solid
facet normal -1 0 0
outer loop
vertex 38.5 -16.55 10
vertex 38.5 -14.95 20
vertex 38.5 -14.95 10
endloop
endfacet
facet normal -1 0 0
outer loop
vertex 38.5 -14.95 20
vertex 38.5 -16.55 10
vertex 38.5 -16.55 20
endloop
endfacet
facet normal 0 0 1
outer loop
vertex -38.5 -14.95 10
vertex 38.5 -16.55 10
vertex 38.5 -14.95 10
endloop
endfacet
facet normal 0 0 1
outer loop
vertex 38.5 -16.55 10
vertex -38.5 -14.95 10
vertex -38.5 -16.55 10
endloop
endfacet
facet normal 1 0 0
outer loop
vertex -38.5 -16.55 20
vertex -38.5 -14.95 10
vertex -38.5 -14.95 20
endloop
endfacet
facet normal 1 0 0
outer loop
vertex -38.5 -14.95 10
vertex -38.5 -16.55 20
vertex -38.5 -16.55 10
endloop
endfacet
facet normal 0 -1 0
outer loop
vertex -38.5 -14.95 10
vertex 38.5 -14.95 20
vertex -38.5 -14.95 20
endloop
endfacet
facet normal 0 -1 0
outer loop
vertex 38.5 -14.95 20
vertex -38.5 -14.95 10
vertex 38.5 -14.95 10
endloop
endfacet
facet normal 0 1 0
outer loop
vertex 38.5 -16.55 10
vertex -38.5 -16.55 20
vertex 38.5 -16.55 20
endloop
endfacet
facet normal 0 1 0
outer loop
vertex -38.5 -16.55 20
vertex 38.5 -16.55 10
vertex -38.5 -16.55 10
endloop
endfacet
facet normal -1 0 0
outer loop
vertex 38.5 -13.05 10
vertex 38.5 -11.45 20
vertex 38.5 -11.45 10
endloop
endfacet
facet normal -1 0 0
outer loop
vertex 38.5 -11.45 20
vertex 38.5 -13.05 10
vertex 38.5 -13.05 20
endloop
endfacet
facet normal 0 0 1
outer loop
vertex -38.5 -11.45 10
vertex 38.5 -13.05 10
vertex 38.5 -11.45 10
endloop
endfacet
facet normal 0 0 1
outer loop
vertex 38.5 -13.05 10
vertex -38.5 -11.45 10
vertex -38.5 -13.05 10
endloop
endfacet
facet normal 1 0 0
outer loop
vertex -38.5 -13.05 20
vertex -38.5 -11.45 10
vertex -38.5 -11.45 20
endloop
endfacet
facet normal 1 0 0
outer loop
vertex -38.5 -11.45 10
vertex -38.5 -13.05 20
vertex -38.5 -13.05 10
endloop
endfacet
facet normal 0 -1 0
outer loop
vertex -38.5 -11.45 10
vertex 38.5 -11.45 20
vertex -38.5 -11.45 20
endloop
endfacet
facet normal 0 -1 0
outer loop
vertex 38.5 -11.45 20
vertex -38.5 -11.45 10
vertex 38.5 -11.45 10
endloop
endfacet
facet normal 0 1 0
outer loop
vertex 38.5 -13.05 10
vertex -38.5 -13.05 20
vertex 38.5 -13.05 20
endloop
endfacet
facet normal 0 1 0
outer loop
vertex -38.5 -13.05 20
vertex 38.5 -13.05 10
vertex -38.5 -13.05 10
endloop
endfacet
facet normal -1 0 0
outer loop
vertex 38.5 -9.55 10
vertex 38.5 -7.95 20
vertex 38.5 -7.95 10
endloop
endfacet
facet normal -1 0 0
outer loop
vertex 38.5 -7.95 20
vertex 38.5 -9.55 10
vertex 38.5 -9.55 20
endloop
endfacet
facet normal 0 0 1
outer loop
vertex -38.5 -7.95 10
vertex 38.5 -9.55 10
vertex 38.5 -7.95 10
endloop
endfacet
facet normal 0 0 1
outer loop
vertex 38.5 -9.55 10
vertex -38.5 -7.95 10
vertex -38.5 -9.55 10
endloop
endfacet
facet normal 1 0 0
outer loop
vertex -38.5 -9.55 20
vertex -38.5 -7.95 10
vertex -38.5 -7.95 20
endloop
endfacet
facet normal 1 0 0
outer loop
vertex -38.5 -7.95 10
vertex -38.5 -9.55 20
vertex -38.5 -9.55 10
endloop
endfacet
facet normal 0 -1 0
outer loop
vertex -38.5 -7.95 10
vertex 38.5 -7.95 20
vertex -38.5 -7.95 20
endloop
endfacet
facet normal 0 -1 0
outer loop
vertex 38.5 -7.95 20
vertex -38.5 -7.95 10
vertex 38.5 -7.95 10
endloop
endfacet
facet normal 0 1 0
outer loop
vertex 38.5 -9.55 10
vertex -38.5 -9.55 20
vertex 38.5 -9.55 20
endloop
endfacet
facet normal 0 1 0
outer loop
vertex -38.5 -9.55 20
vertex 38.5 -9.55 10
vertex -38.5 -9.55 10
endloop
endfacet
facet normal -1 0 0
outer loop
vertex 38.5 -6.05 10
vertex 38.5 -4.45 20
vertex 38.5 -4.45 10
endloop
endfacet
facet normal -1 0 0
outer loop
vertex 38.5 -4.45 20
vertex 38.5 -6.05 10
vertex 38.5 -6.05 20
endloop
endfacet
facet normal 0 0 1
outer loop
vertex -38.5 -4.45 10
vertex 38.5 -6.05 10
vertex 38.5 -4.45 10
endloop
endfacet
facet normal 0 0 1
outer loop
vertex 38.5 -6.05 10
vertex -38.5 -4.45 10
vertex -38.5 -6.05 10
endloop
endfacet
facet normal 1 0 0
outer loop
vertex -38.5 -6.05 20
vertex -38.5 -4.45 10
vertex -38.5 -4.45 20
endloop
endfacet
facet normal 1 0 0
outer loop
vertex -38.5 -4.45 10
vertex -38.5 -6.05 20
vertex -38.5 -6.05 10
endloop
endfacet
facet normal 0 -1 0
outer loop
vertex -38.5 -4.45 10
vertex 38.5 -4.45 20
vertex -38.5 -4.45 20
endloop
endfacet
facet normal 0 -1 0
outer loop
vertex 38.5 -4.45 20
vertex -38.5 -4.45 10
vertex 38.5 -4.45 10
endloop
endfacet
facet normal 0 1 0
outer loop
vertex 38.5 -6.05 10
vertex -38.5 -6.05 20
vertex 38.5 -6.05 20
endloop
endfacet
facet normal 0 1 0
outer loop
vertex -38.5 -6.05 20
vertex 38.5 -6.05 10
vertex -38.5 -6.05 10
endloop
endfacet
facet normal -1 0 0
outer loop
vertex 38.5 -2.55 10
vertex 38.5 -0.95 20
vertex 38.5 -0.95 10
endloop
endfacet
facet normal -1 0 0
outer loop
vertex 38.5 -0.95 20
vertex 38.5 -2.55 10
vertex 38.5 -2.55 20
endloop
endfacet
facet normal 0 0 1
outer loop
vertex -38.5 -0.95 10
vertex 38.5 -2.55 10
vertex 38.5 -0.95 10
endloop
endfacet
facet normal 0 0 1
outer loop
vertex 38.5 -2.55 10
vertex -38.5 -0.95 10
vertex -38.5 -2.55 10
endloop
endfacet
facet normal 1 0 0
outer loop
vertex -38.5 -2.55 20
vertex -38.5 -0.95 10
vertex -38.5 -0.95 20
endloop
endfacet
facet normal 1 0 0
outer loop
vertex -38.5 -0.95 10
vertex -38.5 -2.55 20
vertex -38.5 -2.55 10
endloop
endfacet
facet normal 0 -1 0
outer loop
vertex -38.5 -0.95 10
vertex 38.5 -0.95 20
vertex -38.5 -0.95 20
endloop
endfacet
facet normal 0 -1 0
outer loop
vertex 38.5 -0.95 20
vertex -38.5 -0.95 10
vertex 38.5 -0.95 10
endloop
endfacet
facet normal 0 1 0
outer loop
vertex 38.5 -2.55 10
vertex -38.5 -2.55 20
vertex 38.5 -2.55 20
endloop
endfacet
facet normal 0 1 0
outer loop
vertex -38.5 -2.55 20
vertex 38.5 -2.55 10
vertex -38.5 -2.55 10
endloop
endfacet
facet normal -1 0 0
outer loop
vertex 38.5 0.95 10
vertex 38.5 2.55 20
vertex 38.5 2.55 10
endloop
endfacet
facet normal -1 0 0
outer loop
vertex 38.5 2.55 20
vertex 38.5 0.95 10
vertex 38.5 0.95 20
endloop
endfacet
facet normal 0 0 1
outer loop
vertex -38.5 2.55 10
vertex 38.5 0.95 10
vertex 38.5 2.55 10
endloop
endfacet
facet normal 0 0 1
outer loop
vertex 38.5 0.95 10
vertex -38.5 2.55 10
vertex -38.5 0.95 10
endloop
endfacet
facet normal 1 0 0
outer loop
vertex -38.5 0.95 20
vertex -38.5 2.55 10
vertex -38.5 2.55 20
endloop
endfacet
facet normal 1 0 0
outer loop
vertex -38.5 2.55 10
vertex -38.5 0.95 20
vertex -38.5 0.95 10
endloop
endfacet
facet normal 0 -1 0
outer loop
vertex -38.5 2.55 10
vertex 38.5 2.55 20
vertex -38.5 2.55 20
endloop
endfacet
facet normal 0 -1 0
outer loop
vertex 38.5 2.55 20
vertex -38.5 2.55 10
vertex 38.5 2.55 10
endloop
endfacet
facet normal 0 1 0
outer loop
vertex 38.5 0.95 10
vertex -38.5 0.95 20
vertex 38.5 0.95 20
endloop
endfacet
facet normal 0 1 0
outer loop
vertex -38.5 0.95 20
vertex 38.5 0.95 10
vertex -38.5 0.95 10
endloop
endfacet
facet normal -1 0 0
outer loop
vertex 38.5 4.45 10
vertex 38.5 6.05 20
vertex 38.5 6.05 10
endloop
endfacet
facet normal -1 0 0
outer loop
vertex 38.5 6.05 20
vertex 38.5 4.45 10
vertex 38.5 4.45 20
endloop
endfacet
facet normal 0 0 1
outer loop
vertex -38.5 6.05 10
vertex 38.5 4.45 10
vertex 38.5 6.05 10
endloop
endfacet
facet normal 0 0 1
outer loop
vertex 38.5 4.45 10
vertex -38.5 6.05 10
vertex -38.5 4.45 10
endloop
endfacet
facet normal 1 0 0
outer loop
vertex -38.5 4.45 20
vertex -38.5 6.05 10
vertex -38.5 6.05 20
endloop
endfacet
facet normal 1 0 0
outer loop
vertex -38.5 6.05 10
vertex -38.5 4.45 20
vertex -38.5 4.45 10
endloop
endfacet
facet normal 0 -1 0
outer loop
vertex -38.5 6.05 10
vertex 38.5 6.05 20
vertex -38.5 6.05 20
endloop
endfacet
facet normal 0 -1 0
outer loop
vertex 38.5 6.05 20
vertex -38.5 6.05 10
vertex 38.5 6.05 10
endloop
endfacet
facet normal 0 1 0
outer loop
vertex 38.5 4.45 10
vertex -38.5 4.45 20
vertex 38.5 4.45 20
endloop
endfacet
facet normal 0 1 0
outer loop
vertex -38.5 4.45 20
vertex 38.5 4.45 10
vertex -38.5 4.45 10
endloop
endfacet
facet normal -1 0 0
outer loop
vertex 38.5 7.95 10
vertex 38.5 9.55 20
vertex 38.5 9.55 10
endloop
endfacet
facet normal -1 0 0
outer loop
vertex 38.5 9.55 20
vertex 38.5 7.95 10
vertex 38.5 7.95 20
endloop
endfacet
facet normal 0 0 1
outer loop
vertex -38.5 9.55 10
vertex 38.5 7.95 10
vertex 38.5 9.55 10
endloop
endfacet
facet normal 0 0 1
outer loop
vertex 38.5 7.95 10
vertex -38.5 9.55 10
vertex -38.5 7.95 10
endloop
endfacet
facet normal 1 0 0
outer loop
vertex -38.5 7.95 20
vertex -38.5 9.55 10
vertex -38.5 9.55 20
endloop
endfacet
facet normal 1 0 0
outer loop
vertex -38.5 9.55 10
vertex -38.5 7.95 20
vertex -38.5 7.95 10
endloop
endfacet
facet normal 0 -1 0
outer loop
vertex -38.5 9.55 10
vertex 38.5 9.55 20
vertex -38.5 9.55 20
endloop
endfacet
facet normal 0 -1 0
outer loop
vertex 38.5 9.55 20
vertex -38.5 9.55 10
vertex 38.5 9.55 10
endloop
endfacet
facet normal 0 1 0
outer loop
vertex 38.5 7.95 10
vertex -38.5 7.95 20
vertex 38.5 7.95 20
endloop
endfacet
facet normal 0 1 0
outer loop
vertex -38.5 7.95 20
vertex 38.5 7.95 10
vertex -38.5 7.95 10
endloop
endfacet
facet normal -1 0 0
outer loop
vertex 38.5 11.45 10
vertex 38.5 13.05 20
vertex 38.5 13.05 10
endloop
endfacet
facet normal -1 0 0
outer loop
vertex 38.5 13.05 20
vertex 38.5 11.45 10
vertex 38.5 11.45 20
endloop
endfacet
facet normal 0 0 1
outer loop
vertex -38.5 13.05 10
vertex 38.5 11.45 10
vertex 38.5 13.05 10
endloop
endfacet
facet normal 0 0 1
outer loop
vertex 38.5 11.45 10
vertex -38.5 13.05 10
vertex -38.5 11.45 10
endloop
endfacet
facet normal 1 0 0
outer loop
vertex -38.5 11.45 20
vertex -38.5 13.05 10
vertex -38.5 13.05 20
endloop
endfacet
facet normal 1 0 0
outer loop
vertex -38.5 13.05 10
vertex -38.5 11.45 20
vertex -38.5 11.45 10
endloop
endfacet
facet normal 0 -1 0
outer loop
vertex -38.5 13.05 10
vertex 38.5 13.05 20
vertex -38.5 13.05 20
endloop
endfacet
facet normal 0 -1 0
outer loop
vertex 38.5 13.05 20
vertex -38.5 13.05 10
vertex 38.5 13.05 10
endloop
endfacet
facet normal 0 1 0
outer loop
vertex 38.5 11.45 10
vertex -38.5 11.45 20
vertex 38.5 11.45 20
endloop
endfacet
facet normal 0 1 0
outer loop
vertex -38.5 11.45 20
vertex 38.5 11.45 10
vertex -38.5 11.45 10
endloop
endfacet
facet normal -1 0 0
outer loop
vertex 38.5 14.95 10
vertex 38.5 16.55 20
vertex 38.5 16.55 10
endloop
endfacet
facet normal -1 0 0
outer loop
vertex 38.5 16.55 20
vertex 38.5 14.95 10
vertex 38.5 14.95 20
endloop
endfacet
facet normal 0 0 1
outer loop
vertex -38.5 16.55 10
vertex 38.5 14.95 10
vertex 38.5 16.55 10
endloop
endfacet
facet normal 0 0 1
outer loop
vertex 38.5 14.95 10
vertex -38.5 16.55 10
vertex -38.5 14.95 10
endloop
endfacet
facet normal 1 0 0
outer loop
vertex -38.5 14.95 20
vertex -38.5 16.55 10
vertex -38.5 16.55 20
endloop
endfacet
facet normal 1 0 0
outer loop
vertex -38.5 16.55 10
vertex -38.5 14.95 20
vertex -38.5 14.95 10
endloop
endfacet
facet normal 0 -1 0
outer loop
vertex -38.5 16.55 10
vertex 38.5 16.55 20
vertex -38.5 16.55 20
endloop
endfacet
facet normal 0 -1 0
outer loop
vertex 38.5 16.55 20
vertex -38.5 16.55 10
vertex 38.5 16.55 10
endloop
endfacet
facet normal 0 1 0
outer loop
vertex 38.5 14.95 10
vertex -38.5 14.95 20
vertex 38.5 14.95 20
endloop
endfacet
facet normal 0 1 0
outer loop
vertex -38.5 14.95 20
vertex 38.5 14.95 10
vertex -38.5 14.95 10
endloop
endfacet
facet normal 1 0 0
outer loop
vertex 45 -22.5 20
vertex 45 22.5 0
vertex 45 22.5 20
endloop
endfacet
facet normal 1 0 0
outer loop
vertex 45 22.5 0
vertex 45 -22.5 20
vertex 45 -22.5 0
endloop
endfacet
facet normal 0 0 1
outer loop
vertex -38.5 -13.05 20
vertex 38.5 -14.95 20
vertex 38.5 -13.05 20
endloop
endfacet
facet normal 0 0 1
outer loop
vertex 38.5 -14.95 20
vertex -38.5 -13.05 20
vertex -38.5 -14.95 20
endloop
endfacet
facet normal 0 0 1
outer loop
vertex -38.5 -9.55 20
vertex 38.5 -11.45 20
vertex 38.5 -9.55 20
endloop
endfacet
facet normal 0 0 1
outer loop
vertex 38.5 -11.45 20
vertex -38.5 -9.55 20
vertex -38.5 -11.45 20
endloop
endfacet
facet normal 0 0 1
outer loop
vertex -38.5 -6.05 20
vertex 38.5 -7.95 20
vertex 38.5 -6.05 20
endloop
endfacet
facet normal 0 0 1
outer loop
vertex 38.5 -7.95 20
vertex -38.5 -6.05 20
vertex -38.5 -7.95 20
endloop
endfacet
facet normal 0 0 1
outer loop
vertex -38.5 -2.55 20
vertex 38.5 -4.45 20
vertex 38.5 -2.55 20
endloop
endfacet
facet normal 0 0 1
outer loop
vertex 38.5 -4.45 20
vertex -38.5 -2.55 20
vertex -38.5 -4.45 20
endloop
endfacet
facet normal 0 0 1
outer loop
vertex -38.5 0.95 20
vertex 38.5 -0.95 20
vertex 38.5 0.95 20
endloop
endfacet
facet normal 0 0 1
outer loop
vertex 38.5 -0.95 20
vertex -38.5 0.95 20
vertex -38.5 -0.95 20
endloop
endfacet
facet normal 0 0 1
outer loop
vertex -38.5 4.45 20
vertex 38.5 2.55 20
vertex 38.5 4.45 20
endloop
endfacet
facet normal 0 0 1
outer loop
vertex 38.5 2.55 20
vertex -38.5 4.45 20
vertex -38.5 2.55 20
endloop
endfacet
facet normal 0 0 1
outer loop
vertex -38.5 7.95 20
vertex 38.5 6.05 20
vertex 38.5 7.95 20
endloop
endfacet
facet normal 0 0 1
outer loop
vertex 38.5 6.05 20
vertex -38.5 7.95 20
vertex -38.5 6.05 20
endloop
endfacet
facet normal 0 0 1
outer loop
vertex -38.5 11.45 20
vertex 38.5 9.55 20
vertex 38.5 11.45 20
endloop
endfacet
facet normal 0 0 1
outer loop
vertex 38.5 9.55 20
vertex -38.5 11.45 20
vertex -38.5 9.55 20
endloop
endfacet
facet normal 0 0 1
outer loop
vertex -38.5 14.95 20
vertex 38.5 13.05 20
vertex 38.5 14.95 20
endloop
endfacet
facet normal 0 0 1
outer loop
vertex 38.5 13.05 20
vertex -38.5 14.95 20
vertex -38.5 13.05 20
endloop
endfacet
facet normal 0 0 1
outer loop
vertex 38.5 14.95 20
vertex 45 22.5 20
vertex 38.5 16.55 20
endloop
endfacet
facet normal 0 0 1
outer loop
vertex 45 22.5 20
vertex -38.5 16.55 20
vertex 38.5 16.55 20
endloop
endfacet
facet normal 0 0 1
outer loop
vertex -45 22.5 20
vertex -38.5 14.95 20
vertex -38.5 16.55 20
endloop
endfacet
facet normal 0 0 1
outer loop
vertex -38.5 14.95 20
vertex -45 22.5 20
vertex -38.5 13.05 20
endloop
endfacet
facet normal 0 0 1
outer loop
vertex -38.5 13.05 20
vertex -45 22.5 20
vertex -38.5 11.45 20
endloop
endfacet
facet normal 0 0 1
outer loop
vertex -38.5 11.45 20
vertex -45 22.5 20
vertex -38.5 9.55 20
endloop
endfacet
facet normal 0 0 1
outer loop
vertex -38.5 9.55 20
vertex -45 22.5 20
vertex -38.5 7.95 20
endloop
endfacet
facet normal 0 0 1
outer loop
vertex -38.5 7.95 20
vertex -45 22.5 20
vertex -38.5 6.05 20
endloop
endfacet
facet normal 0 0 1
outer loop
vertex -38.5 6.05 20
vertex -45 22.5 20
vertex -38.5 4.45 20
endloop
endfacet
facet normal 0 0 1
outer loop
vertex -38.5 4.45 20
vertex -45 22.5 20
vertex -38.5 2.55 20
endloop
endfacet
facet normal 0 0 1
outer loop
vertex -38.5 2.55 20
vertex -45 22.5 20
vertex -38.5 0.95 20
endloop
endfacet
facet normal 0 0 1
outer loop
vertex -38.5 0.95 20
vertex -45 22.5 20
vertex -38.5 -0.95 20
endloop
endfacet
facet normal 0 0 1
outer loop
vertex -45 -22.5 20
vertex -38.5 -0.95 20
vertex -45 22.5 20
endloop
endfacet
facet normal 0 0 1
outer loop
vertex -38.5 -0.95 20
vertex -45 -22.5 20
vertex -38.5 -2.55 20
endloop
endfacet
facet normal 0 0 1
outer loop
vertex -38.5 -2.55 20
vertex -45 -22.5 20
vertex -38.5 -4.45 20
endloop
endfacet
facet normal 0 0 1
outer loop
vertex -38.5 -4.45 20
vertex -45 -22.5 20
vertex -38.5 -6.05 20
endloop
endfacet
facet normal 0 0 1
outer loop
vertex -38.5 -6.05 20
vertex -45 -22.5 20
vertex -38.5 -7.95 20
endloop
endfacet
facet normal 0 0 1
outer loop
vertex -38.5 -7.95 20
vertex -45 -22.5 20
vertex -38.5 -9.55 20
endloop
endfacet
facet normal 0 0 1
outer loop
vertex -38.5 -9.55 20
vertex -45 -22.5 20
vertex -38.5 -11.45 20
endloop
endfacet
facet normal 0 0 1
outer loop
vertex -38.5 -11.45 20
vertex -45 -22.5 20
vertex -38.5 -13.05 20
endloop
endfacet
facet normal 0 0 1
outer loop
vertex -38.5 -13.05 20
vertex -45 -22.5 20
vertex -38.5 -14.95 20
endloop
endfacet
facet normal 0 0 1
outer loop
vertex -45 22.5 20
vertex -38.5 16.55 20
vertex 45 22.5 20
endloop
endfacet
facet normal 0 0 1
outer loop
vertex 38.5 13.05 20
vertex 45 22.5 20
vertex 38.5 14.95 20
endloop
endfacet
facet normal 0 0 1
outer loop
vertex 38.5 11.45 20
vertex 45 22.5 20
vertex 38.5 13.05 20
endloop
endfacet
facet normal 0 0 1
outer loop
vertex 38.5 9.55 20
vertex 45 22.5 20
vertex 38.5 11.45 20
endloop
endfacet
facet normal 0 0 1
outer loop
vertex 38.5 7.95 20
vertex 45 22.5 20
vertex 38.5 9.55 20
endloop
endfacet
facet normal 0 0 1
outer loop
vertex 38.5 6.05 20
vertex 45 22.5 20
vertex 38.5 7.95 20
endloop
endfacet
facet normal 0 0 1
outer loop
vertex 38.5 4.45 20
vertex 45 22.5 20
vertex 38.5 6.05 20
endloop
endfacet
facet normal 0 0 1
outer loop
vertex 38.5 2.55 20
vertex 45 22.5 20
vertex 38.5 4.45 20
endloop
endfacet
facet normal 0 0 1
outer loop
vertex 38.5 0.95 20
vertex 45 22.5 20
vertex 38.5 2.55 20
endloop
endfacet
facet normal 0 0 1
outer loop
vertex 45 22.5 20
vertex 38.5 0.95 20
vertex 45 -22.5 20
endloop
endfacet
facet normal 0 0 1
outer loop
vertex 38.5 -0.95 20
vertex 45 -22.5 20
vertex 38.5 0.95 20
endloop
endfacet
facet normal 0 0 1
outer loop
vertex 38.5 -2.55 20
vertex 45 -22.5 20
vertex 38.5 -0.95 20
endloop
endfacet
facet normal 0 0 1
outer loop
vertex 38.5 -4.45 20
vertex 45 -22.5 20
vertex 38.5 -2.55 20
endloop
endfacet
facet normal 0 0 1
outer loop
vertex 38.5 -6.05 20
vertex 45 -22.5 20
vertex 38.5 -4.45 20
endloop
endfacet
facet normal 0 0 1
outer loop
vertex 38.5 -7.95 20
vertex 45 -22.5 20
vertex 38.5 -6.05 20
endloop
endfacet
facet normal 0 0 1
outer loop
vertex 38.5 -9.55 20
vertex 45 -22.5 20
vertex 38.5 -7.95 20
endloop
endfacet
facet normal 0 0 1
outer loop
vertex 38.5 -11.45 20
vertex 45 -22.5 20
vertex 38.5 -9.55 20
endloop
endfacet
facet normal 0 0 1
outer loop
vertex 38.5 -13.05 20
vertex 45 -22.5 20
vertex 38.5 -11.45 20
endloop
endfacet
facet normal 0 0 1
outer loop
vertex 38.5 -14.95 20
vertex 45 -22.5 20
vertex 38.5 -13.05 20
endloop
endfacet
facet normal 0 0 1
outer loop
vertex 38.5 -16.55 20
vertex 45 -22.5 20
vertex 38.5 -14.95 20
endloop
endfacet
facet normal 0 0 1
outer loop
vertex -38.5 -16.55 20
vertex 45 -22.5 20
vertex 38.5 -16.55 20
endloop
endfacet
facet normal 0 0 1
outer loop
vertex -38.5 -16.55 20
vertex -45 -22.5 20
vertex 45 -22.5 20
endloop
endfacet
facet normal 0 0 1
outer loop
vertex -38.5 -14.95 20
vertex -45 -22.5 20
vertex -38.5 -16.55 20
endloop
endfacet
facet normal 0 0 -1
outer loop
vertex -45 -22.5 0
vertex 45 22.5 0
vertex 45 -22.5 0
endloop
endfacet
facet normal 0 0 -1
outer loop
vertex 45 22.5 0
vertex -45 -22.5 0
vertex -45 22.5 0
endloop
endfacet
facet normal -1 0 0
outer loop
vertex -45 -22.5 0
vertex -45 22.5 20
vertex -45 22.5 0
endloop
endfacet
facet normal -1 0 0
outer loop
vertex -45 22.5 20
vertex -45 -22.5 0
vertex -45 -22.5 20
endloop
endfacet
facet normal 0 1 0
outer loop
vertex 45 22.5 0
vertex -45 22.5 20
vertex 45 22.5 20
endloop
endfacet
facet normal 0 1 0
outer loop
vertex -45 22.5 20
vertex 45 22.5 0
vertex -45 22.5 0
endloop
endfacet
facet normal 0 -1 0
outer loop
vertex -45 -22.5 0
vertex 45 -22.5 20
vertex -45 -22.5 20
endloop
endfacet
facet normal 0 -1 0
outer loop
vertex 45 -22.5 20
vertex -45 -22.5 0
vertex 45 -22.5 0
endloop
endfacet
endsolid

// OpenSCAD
// --- Dimensions (mm) ---
block_length = 90.0;      // X dimension of the base block
block_width = 45.0;       // Y dimension of the base block
block_height = 20.0;      // Z dimension of the base block

slide_length = 75.0;      // Length of the slide (for reference)
slot_length = 77.0;       // Length of the slot along X
slot_width = 1.6;         // Width of the slot along Y
slot_depth = 10.0;        // Depth of the slot along Z

num_slots = 10;           // Number of slots
slot_spacing = 3.5;       // Center-to-center distance between slots in Y

// --- Resolution ---
$fn = 64;

// --- Implementation ---

// The part is centered on X and Y, resting on Z=0
module drying_rack() {
    difference() {
        // The main base block
        cube([block_length, block_width, block_height], center = true);

        // The slots
        // We calculate the starting Y position to ensure the group is centered.
        // Total span of centers = (num_slots - 1) * slot_spacing
        // We subtract half the width of one slot to find the edge of the first slot center.
        // However, to center the group, we calculate the total width occupied by the slots.
        
        let (
            total_span = (num_slots - 1) * slot_spacing,
            start_y = -total_span / 2
        )
        for (i = [0 : num_slots - 1]) {
            translate([0, start_y + (i * slot_spacing), block_height/2 - slot_depth/2 + 0.01])
            cube([slot_length, slot_width, slot_depth + 0.02], center = true);
        }
    }
}

// Render the part
// Note: The cube is centered, so we translate it to sit on Z=0
translate([0, 0, block_height/2])
drying_rack();
